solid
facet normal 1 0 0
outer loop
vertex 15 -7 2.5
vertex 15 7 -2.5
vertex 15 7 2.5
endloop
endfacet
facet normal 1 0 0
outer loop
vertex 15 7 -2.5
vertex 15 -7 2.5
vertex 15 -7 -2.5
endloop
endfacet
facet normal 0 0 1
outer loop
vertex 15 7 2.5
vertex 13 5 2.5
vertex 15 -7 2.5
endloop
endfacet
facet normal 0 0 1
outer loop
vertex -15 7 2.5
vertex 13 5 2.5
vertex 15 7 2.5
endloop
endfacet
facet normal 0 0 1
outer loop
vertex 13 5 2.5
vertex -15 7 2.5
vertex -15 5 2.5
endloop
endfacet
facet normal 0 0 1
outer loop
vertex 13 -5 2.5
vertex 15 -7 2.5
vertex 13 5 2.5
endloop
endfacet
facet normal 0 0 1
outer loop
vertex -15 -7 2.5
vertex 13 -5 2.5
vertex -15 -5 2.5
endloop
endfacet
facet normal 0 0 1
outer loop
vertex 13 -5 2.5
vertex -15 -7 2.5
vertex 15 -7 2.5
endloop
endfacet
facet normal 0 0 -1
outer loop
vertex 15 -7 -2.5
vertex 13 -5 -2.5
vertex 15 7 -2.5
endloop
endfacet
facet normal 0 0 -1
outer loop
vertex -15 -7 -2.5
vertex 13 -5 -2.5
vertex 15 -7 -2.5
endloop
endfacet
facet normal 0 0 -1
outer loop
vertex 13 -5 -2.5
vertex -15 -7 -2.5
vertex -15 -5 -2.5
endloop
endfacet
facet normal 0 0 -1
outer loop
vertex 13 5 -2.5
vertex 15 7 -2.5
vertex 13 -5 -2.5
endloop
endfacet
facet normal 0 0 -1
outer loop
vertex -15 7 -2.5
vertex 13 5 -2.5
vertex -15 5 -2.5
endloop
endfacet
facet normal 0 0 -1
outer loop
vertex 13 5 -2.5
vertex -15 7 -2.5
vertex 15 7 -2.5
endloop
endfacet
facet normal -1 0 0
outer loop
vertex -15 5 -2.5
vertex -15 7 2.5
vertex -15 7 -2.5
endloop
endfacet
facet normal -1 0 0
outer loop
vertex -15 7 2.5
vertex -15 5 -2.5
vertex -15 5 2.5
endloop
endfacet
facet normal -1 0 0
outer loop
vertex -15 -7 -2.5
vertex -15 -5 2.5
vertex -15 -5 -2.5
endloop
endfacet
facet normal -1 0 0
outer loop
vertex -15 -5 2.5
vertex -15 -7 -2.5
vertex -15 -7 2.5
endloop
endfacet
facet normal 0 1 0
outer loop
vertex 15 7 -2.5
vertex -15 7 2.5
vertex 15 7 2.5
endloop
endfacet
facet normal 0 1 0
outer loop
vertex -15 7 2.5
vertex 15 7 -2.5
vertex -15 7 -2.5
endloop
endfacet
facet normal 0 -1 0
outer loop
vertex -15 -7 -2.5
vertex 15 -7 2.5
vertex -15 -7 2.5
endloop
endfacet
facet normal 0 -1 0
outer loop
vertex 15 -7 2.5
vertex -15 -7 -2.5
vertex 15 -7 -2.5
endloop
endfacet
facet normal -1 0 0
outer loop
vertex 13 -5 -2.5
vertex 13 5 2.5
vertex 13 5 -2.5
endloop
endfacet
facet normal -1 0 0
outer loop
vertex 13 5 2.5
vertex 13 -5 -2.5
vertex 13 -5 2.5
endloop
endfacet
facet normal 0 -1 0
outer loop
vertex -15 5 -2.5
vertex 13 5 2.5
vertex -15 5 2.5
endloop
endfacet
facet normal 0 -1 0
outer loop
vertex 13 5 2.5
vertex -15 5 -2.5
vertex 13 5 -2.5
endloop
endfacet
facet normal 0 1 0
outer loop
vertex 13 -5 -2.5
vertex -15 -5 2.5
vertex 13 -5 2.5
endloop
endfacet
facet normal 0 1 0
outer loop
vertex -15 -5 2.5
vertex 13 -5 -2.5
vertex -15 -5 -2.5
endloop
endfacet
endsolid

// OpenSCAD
// Some simple print for a comparison of filament materials.


module rectangular_u() {
    difference() {
        cube([30, 14, 5], center=true);
        translate([-1, 0, 0]) cube([28, 10, 5], center=true);
    }
}


rectangular_u();
